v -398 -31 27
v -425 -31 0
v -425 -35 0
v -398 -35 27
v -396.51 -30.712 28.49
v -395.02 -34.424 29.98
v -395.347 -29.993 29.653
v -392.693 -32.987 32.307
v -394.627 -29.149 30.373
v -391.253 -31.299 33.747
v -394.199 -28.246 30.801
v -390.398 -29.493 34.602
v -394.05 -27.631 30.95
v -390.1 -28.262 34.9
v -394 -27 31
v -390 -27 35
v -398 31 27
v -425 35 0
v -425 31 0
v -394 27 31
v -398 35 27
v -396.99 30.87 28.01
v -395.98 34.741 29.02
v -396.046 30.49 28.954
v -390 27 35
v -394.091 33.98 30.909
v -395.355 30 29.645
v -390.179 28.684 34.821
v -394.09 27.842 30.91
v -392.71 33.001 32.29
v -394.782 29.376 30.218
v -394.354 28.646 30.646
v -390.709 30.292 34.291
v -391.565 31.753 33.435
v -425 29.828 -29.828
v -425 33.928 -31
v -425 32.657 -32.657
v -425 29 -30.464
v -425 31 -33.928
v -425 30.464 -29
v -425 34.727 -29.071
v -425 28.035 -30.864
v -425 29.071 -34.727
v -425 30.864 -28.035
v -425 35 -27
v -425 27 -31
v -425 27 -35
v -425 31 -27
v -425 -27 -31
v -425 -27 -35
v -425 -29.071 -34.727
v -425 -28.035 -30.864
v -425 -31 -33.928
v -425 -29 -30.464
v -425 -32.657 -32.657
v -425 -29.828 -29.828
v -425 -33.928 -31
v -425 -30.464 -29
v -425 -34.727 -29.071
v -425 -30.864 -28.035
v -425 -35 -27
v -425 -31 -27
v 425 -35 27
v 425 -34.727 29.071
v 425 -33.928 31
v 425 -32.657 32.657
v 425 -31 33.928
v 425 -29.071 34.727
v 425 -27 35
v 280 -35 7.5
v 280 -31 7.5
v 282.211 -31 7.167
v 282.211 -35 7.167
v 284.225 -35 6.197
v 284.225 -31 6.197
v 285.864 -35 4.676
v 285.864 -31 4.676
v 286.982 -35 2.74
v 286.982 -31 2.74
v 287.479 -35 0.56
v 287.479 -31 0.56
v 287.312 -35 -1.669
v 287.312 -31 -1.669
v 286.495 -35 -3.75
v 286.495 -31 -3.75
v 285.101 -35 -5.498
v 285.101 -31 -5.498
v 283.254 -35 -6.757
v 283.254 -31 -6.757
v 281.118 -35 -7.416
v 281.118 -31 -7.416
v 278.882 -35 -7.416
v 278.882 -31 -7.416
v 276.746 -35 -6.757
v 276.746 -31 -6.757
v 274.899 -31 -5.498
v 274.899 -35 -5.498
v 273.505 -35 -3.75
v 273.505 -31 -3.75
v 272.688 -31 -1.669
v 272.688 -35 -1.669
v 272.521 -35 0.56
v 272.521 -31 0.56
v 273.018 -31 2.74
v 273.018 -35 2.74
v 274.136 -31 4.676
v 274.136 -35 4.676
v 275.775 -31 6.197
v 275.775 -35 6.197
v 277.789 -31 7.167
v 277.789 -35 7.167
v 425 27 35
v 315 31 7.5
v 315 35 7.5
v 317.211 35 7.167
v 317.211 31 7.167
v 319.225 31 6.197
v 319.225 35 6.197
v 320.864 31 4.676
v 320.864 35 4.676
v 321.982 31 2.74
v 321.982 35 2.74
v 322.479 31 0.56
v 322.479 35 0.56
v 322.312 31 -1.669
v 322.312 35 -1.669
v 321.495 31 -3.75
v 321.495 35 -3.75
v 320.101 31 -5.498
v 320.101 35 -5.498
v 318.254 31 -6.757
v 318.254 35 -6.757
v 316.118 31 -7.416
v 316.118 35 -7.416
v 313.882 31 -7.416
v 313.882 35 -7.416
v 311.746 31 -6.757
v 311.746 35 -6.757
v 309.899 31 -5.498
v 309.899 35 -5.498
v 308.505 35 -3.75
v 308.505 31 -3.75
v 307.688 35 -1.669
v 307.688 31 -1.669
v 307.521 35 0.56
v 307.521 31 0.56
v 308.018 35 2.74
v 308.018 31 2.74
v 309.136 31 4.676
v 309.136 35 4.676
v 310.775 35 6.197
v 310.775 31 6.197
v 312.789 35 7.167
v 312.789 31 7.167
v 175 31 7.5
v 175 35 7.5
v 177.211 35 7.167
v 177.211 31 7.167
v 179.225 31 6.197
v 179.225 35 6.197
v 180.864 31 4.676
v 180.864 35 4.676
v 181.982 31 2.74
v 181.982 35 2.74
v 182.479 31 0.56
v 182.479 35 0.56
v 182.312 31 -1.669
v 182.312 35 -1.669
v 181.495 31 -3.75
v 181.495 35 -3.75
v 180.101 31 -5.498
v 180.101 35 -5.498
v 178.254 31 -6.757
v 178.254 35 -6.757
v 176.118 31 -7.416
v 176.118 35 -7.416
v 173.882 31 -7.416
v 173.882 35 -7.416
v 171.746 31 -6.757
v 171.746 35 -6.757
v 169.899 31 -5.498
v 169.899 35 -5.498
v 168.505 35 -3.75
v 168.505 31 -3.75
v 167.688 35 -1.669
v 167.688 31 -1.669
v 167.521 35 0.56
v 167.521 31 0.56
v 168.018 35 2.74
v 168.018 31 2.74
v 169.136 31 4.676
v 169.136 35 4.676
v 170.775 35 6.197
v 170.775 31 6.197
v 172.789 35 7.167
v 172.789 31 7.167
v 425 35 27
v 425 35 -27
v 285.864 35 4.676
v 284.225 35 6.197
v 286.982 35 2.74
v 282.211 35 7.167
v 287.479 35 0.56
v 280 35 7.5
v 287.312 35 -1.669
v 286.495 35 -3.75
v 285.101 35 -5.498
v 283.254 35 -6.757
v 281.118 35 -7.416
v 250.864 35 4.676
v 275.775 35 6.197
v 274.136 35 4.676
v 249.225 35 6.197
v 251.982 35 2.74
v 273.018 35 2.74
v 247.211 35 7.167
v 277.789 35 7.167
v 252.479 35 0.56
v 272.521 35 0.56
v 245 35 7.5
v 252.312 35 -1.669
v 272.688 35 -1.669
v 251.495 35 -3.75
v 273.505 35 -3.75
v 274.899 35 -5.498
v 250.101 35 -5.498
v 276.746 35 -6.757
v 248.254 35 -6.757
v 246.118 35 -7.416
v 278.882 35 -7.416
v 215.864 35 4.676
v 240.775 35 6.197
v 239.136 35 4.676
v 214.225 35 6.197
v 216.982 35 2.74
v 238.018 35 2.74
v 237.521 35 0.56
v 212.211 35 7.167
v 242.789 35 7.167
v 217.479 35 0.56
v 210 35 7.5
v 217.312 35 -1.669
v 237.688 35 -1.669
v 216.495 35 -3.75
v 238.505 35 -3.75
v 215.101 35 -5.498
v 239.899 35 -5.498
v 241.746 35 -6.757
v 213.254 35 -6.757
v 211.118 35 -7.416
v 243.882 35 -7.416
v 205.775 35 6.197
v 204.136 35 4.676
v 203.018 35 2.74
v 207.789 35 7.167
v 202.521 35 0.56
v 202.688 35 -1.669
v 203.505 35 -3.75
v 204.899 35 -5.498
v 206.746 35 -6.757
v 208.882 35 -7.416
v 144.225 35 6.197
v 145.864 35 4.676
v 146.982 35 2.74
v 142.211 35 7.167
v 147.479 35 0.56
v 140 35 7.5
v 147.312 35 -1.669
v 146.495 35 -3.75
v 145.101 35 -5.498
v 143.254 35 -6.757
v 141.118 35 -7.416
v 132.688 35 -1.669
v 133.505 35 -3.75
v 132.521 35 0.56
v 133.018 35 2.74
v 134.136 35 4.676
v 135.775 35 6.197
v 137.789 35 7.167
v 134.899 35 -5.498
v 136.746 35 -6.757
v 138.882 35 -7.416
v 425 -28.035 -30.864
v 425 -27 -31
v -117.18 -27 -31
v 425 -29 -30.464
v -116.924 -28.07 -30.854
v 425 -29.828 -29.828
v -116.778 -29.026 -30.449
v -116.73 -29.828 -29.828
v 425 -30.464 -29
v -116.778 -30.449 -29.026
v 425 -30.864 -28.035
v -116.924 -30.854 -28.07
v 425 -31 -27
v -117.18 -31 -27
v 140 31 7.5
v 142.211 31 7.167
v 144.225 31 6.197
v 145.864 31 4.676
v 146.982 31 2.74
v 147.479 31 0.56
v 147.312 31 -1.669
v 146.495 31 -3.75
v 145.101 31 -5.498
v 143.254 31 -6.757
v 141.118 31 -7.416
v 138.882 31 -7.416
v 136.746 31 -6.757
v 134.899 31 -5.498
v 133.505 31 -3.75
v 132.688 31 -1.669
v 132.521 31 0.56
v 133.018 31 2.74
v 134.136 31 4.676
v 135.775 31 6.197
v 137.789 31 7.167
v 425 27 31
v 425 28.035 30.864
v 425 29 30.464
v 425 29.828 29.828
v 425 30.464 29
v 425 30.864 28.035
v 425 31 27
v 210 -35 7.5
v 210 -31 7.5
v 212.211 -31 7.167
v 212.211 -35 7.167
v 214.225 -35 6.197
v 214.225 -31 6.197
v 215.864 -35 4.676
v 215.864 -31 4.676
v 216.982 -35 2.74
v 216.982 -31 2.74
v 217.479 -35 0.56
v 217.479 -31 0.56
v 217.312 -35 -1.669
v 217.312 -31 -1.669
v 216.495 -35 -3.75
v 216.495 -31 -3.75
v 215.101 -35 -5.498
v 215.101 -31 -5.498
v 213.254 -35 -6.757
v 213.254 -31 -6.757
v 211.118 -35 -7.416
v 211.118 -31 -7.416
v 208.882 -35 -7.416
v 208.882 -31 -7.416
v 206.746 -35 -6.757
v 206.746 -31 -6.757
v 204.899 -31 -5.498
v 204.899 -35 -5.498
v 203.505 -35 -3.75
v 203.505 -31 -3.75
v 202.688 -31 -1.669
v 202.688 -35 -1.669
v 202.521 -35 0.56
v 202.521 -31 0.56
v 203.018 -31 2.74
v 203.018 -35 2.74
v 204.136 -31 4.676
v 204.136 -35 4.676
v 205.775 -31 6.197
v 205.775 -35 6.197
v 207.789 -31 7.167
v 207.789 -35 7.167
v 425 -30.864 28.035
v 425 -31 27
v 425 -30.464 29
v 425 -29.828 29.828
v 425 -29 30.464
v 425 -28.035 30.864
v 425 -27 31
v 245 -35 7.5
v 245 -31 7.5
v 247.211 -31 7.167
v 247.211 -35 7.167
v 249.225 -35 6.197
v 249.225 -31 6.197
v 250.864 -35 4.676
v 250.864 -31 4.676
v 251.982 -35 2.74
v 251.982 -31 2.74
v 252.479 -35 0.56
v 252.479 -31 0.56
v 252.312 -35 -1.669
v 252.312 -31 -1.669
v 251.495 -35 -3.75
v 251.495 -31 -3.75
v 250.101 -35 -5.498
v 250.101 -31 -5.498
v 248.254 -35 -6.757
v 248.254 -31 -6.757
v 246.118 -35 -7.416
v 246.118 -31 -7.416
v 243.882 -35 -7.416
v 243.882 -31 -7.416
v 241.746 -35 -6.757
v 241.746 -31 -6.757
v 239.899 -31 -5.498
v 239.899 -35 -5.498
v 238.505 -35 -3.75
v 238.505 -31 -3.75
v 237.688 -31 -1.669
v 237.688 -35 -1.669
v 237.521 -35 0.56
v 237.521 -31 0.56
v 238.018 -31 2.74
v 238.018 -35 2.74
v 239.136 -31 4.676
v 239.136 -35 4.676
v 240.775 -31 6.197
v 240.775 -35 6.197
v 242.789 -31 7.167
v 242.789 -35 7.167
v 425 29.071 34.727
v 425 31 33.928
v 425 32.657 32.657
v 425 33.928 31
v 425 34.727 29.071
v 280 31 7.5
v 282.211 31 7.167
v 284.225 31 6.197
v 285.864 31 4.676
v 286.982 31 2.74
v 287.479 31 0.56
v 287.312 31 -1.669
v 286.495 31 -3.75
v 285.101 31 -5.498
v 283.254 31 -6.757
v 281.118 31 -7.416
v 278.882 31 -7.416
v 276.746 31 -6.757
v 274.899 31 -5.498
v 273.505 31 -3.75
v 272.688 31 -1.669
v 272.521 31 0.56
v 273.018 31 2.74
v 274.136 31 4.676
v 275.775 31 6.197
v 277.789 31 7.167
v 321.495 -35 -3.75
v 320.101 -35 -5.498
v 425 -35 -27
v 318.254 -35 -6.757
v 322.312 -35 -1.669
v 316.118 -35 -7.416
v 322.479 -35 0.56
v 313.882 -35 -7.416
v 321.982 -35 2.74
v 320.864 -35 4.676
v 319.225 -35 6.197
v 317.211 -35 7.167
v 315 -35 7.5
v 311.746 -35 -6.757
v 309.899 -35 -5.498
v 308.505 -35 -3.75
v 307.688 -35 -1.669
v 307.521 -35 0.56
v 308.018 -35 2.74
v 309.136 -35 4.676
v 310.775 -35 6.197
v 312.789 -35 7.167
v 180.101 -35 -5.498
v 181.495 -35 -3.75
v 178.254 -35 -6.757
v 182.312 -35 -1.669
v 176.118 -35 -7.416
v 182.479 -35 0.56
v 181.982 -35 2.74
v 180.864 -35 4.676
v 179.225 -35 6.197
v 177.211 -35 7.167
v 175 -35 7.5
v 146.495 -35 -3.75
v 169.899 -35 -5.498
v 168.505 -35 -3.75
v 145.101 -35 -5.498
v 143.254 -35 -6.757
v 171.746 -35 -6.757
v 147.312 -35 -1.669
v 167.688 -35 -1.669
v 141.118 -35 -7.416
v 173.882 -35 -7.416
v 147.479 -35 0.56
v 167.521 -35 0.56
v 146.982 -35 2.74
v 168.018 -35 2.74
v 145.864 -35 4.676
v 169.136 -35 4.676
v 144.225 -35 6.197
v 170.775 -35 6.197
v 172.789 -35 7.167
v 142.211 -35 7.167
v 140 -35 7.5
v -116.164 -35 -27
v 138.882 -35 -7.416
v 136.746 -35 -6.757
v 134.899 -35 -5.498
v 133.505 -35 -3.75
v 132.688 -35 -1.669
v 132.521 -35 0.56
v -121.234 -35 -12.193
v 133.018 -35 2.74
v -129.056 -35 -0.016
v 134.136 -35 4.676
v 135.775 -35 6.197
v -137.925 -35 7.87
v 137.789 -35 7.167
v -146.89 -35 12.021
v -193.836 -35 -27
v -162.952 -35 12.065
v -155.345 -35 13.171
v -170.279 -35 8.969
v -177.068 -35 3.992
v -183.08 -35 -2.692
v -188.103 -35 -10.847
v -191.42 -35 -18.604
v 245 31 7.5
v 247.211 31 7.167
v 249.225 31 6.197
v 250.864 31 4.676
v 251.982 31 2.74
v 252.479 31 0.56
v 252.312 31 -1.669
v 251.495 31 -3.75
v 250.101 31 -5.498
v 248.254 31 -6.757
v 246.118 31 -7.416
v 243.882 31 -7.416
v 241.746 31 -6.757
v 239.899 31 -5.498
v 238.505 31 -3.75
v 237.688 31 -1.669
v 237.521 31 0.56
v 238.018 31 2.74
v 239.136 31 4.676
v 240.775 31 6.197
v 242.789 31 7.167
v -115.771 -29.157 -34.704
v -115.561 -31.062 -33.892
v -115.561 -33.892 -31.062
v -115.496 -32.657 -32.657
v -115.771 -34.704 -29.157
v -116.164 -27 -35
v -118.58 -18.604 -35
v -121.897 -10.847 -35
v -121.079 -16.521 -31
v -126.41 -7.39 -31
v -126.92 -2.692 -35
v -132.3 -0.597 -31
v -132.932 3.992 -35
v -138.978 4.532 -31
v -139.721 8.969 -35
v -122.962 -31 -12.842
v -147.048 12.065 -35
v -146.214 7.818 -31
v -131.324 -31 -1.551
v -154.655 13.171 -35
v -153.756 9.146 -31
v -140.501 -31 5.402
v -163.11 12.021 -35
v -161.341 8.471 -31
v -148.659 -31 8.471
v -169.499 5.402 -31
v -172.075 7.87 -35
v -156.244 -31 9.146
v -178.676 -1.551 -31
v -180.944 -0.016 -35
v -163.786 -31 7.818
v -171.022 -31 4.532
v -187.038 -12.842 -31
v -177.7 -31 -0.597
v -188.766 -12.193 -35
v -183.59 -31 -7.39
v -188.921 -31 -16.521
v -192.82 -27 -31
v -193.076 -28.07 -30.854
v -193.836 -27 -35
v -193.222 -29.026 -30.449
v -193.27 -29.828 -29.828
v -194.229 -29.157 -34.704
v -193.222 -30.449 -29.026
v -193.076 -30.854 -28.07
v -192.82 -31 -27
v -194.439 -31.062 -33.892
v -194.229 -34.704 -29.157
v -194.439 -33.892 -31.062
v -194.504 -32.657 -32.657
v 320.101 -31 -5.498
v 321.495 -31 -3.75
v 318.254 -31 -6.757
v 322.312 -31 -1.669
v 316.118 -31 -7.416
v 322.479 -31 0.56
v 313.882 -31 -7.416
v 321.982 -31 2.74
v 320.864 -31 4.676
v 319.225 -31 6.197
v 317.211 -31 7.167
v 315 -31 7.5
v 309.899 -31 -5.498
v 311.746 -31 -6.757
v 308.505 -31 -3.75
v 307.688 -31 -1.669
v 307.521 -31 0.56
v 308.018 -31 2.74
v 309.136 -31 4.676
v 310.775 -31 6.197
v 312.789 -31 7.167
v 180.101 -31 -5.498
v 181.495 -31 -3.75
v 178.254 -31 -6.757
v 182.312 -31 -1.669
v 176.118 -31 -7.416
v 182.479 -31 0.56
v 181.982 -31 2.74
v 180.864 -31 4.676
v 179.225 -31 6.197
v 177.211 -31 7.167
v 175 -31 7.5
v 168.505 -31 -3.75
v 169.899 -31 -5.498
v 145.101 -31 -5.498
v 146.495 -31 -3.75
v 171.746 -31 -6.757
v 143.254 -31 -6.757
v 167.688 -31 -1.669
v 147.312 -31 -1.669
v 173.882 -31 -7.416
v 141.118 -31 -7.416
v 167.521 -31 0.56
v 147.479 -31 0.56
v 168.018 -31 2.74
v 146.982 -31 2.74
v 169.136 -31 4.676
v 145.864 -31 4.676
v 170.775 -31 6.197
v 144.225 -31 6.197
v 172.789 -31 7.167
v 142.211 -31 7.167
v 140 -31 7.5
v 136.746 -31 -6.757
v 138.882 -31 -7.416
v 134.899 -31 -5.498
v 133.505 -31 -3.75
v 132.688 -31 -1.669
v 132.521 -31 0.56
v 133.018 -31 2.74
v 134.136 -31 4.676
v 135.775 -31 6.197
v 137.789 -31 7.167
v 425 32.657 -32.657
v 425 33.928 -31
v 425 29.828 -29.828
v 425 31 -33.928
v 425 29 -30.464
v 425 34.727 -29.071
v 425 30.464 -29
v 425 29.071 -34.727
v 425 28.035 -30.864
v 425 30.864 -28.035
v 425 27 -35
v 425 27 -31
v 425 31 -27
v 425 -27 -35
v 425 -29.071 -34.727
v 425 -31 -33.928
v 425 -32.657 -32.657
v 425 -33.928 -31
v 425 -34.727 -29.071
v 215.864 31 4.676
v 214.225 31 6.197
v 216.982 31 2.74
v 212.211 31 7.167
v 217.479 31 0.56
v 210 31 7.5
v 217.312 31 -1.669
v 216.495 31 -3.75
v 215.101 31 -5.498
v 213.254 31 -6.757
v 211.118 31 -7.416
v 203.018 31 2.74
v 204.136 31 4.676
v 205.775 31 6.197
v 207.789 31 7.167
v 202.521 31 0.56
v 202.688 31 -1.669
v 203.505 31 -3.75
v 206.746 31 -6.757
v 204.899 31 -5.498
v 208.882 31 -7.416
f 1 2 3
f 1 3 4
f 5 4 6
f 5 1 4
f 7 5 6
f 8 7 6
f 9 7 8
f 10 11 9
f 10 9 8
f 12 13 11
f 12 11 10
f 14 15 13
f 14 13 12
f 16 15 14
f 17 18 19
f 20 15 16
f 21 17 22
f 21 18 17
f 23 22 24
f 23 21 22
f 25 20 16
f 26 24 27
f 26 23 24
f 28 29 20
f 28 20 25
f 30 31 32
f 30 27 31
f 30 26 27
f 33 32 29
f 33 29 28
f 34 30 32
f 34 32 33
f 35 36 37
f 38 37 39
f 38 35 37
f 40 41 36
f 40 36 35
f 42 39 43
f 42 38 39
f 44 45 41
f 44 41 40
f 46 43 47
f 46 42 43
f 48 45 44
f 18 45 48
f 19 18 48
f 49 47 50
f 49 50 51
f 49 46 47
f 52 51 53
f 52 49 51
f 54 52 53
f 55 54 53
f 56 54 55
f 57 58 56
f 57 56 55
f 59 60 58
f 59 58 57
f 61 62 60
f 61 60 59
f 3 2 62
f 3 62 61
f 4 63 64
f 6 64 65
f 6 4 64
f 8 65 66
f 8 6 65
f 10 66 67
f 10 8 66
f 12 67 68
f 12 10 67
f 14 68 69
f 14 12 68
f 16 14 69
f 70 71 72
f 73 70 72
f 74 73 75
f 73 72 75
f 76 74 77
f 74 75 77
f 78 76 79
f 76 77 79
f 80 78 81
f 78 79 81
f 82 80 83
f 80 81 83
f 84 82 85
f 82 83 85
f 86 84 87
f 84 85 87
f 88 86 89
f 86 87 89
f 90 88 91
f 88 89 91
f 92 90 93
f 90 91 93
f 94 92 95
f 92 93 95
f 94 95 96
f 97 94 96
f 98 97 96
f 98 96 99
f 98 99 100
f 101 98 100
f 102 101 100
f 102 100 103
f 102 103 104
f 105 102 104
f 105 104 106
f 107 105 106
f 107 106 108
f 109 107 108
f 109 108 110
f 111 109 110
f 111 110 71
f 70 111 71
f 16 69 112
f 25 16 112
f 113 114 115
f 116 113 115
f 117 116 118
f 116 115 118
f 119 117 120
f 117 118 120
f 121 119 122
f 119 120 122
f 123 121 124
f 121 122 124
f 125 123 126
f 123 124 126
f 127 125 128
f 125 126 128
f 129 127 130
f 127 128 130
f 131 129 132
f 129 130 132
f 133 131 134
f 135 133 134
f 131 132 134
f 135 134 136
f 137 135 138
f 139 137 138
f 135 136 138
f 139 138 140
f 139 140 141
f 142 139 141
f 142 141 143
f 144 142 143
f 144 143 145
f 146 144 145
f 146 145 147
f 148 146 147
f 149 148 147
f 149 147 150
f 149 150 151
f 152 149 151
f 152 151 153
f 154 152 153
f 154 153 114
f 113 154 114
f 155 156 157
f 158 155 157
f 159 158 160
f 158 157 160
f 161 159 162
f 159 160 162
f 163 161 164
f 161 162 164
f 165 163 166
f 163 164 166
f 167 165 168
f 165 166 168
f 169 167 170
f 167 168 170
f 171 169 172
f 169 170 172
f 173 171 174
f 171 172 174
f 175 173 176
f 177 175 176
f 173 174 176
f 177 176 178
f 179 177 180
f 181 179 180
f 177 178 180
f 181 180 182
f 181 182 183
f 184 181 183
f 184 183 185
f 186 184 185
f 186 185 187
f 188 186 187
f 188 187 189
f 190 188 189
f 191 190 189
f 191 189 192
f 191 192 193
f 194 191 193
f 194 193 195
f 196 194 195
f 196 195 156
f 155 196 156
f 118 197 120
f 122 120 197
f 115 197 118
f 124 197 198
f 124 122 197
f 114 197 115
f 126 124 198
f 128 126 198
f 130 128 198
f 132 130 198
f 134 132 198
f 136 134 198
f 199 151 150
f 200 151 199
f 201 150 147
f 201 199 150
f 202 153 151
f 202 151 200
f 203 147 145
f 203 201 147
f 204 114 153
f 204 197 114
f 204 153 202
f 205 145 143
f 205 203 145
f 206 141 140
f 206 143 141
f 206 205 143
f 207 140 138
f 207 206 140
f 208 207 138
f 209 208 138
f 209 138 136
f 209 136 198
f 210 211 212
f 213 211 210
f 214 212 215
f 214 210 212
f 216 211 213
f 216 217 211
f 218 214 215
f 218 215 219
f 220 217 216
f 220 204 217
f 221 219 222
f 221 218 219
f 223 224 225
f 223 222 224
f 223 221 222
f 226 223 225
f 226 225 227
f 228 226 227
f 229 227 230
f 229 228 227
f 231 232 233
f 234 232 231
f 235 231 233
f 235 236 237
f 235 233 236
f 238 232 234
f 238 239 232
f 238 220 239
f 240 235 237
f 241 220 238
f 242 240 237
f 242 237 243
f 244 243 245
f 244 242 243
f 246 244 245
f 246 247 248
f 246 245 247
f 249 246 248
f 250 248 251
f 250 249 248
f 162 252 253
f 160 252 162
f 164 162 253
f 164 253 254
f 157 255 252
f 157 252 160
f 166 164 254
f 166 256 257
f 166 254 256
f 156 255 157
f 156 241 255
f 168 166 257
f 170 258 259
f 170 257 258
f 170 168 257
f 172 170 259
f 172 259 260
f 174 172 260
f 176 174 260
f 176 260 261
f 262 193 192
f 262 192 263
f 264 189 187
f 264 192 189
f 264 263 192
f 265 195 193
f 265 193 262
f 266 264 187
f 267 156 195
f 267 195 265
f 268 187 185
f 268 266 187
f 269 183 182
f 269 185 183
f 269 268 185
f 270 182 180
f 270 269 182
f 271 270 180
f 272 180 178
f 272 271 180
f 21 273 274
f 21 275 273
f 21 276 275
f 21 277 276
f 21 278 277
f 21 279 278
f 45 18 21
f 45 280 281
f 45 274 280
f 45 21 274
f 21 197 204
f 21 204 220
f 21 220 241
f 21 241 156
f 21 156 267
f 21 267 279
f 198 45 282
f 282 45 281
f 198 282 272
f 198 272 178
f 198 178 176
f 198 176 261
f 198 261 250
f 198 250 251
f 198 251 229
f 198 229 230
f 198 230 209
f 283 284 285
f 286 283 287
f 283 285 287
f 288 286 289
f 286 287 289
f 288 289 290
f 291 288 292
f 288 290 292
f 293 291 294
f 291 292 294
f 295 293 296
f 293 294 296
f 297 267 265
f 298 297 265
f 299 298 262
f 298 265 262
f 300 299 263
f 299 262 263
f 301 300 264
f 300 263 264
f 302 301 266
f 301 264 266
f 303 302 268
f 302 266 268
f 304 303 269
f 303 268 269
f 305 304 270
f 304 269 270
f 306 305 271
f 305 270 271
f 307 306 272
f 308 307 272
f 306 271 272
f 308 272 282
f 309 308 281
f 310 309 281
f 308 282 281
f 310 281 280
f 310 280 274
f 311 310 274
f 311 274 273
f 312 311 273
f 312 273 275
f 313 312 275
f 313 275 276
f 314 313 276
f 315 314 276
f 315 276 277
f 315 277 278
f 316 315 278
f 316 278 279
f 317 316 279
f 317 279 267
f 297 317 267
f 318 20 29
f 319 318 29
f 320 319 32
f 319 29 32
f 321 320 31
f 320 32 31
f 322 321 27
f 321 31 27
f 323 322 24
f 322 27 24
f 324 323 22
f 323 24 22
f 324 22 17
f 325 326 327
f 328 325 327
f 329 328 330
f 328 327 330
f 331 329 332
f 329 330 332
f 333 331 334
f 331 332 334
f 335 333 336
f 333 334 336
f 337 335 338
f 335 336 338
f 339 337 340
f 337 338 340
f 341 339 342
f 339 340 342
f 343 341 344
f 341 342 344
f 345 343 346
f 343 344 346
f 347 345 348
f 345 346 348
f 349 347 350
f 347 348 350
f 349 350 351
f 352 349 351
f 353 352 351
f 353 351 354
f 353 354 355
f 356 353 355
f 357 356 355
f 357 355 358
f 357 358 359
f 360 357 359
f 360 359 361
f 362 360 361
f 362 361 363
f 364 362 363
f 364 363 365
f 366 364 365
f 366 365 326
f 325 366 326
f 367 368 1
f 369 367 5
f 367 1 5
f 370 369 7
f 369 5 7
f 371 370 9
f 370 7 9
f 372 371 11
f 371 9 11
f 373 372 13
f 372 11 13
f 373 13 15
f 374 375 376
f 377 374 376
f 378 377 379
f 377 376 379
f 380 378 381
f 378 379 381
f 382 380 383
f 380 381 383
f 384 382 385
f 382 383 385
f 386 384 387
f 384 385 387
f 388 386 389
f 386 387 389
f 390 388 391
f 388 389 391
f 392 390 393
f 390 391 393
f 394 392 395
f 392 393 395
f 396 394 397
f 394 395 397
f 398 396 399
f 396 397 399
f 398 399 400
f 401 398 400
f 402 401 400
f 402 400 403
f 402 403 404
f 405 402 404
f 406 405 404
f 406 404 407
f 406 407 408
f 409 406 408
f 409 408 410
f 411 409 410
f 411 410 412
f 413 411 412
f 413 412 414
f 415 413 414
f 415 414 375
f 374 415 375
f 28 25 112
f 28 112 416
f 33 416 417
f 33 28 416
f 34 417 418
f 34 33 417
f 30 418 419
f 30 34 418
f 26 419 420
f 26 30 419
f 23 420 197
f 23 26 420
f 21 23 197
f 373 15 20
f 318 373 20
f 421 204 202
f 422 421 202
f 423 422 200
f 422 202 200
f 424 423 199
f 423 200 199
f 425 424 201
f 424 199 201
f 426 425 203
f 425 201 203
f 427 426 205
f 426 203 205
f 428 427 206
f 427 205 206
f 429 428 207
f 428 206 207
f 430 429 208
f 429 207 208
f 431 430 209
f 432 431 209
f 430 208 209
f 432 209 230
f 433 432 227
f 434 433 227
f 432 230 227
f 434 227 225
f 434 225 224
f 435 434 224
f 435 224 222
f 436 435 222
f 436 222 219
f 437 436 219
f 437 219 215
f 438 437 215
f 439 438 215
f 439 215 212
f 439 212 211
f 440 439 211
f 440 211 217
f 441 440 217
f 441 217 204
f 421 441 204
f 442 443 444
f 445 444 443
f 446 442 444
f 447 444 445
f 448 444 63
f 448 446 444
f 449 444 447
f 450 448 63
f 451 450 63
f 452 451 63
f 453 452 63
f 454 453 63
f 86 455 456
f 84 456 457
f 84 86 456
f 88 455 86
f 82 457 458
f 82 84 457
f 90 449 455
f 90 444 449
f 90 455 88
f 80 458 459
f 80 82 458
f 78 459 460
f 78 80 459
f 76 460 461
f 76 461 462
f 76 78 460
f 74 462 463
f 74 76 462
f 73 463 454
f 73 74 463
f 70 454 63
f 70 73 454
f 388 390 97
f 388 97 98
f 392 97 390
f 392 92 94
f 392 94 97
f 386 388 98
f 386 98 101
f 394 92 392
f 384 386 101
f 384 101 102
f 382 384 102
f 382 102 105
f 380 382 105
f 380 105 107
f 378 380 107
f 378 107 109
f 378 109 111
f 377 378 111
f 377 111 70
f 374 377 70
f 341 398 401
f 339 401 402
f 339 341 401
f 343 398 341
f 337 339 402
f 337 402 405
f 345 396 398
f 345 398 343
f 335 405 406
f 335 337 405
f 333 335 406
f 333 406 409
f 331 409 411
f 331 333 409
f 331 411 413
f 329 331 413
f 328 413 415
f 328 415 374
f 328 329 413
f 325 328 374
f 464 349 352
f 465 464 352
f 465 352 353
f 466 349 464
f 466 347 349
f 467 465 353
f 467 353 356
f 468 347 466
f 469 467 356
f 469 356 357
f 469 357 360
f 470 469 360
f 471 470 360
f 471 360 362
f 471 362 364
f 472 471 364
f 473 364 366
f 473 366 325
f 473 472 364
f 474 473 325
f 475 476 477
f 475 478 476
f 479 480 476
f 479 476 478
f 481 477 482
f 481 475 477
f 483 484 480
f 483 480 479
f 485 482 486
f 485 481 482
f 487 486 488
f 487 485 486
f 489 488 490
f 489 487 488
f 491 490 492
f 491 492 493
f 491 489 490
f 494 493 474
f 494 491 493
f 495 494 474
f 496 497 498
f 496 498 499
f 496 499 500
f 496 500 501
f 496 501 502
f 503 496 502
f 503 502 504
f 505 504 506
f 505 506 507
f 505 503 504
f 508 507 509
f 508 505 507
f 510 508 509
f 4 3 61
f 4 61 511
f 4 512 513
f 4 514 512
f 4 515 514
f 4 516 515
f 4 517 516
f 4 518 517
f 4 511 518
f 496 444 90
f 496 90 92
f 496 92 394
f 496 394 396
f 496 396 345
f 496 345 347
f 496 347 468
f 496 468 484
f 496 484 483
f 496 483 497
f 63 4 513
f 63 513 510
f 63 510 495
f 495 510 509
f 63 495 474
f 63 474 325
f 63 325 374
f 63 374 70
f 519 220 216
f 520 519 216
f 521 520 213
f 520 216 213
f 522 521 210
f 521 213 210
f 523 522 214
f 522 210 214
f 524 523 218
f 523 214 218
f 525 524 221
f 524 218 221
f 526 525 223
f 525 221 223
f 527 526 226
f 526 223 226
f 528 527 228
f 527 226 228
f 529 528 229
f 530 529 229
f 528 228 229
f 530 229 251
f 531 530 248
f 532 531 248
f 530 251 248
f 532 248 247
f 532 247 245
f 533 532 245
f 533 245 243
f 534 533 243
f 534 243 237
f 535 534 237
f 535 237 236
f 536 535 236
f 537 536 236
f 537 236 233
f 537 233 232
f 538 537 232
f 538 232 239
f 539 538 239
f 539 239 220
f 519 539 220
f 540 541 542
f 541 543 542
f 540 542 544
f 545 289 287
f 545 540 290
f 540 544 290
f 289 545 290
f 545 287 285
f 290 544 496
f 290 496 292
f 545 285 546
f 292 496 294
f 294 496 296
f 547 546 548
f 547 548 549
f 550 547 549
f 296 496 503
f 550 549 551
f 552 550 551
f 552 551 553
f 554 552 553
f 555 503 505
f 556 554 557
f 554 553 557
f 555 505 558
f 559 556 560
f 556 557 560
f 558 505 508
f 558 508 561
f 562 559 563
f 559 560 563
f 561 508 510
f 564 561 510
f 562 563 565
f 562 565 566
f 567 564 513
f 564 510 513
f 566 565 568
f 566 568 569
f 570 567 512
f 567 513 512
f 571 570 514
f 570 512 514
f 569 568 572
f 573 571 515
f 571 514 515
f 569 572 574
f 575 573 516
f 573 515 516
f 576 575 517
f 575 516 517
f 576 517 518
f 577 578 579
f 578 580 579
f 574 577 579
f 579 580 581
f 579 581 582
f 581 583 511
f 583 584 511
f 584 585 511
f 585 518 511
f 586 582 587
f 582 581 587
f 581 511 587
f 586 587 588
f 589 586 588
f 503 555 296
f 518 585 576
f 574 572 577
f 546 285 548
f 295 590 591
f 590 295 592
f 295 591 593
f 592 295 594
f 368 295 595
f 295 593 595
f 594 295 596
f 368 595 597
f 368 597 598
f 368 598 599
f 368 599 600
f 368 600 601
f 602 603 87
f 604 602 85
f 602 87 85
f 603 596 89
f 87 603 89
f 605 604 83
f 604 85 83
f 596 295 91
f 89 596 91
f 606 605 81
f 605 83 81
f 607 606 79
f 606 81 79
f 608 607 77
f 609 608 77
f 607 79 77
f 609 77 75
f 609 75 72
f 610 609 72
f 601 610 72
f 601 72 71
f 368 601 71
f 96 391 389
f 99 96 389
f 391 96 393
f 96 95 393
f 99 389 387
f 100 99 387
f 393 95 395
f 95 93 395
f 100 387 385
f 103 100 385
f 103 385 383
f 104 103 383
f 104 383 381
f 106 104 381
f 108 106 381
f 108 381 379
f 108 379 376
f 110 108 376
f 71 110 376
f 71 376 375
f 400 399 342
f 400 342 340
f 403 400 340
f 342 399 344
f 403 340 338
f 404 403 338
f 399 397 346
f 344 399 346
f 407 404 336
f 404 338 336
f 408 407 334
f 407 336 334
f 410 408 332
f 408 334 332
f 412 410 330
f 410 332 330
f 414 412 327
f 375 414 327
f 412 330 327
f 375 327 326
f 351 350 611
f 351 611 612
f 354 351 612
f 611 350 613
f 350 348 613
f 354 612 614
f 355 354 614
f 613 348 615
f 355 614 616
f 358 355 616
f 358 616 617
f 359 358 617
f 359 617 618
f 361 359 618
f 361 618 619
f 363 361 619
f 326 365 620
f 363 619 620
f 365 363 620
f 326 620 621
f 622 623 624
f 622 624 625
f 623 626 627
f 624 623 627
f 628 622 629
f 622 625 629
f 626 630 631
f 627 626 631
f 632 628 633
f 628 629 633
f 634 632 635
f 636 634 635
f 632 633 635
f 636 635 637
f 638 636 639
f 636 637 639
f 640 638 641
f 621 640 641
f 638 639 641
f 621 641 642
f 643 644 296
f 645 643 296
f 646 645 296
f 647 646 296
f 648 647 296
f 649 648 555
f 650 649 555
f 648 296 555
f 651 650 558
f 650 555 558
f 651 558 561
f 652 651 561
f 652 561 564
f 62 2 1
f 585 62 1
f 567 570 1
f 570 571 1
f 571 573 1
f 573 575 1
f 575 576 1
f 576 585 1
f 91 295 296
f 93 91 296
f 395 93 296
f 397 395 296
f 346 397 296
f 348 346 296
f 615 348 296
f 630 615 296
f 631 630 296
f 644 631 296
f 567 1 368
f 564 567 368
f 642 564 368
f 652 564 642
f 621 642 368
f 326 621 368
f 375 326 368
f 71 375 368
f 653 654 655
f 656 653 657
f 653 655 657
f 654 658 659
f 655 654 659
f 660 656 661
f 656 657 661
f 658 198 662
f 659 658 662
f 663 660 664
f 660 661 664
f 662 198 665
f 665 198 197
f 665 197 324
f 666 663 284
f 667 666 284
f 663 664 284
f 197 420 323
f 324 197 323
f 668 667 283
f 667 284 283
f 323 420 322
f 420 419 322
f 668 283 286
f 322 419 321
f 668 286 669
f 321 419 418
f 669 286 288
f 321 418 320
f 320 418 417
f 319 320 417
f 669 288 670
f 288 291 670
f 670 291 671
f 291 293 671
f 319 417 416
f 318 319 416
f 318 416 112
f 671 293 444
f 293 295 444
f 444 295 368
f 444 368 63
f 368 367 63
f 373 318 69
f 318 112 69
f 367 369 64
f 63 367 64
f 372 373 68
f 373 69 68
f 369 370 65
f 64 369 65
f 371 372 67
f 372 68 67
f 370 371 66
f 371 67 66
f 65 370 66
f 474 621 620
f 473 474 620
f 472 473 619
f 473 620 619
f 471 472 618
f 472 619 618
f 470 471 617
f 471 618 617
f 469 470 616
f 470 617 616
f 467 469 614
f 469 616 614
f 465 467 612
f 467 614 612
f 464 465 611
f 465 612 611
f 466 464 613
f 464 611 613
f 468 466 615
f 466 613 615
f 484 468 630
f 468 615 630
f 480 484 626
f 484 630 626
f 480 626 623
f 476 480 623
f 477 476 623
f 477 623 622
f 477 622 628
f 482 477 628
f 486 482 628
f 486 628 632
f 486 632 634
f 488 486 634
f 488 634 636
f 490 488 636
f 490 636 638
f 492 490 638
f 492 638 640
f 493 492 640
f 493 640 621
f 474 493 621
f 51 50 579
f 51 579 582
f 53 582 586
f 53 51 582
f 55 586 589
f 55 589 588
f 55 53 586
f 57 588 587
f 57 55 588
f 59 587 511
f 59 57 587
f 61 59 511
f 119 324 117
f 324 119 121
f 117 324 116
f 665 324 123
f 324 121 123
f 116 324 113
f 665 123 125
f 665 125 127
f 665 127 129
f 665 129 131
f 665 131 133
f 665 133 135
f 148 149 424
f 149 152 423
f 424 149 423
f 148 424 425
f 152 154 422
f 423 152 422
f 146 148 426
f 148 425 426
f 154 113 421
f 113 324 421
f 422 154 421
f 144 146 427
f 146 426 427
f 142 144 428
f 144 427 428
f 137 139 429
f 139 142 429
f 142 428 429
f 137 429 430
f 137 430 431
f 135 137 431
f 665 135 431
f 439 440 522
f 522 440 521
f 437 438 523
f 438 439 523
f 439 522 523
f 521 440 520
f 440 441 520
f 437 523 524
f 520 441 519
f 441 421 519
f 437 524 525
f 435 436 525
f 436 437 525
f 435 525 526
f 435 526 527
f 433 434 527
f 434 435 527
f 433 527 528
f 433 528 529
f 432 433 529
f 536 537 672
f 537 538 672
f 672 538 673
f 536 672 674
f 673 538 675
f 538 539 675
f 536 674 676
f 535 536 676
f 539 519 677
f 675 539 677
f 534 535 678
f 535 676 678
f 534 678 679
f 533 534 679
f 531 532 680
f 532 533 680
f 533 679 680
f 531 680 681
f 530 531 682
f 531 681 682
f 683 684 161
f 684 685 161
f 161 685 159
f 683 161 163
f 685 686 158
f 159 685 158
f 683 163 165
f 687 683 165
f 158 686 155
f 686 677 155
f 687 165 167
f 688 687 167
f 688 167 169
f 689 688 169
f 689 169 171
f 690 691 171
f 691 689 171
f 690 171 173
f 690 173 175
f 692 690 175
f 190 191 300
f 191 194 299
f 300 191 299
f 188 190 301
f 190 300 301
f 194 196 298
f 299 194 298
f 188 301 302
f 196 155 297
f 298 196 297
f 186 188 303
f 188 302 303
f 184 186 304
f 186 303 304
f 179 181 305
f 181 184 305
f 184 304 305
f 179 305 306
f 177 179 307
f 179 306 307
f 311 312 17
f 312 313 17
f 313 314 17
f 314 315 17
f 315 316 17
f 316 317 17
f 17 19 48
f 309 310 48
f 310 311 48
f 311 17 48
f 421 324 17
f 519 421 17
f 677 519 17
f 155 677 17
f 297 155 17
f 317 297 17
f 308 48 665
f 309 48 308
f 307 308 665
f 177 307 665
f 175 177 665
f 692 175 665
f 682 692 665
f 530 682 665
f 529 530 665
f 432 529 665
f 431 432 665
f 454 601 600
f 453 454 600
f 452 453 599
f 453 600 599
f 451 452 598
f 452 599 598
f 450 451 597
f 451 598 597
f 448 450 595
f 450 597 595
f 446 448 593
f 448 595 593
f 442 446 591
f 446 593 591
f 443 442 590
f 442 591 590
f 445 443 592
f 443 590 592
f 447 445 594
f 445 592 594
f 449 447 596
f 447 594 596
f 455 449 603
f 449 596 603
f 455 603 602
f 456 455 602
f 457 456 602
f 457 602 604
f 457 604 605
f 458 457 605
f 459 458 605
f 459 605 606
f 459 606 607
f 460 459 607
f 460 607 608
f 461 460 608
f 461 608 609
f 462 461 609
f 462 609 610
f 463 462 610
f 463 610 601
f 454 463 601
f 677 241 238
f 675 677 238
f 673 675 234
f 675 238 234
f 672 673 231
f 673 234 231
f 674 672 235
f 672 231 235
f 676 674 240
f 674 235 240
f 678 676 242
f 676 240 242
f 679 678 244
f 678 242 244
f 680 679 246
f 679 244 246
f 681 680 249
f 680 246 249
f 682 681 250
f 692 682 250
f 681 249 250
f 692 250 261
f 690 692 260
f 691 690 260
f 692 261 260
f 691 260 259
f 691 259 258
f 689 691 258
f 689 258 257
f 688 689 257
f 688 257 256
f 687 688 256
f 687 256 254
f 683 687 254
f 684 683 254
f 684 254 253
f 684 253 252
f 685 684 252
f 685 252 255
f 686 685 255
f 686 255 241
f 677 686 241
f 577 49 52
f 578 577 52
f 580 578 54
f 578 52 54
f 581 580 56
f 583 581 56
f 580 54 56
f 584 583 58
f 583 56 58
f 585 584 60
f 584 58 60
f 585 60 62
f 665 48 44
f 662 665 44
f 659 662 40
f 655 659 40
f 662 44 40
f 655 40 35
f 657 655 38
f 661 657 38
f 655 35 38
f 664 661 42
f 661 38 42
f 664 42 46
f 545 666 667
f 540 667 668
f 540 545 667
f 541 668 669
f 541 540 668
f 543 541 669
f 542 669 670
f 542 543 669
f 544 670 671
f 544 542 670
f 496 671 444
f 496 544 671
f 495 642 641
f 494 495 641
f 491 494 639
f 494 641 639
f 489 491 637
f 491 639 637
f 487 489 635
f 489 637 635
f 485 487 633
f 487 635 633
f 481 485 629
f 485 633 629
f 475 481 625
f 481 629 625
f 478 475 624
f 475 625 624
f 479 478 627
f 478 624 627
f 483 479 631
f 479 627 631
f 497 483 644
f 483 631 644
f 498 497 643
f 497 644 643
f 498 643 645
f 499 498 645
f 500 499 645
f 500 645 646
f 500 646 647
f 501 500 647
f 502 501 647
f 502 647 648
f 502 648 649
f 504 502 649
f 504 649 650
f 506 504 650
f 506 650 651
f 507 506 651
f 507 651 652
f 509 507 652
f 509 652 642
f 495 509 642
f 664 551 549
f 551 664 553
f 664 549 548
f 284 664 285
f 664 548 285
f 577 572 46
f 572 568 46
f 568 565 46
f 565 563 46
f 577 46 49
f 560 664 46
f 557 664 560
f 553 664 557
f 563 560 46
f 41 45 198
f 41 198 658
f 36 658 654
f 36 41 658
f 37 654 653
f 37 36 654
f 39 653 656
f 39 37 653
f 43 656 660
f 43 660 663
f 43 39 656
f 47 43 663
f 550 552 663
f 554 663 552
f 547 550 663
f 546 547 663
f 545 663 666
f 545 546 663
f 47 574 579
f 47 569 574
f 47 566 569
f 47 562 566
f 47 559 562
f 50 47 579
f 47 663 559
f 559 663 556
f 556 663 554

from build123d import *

# Parameters (mm, degrees)
EL_MENT_M_CANO_SOUD_1_DEPTH = 850
ESQUISSE3_R                 = 7.5
ENL_V_MAT_EXTRU_2_DEPTH     = 90
ENL_V_MAT_EXTRU_3_DEPTH     = 71
ESQUISSE6_R                 = 40.75
ENL_V_MAT_EXTRU_4_DEPTH     = 90


with BuildPart() as part:
    # tube carré1 → Elément mécano-soudé1 (new body)
    with BuildSketch(Plane.YZ.offset(-425)):
        with BuildLine():
            Line((-27, 35), (27, 35))
            ThreePointArc((27, 35), (32.656854249, 32.656854249), (35, 27))
            Line((35, 27), (35, -27))
            ThreePointArc((35, -27), (32.656854249, -32.656854249), (27, -35))
            Line((27, -35), (-27, -35))
            ThreePointArc((-27, -35), (-32.656854249, -32.656854249), (-35, -27))
            Line((-35, -27), (-35, 27))
            ThreePointArc((-35, 27), (-32.656854249, 32.656854249), (-27, 35))
        make_face()
        with BuildLine():
            Line((-27, 31), (27, 31))
            ThreePointArc((27, 31), (29.828427336, 29.828426914), (31, 26.999999403))
            Line((31, 26.999999403), (31, -26.999999403))
            ThreePointArc((31, -26.999999403), (29.828427336, -29.828426914), (27, -31))
            Line((27, -31), (-27, -31))
            ThreePointArc((-27, -31), (-29.828427336, -29.828426914), (-31, -26.999999403))
            Line((-31, -26.999999403), (-31, 26.999999403))
            ThreePointArc((-31, 26.999999403), (-29.828427336, 29.828426914), (-27, 31))
        make_face(mode=Mode.SUBTRACT)
    extrude(amount=EL_MENT_M_CANO_SOUD_1_DEPTH)

    # Esquisse3 → Enlèv. mat.-Extru.2 (cut)
    with BuildSketch(Plane(origin=(0, 35, 0), x_dir=(1, 0, 0), z_dir=(0, 1, 0))):
        with Locations(Location((315, 0, 0), (0, 0, 270))):  # turned: the seam where the file's is
            Circle(ESQUISSE3_R)
        with Locations(Location((280, 0, 0), (0, 0, 270))):  # turned: the seam where the file's is
            Circle(ESQUISSE3_R)
        with Locations(Location((245, 0, 0), (0, 0, 270))):  # turned: the seam where the file's is
            Circle(ESQUISSE3_R)
        with Locations(Location((210, 0, 0), (0, 0, 270))):  # turned: the seam where the file's is
            Circle(ESQUISSE3_R)
        with Locations(Location((175, 0, 0), (0, 0, 270))):  # turned: the seam where the file's is
            Circle(ESQUISSE3_R)
        with Locations(Location((140, 0, 0), (0, 0, 270))):  # turned: the seam where the file's is
            Circle(ESQUISSE3_R)
    extrude(amount=-ENL_V_MAT_EXTRU_2_DEPTH, mode=Mode.SUBTRACT)

    # Esquisse5 → Enlèv. mat.-Extru.3 (cut, through all)
    with BuildSketch(Plane(origin=(0, 35, 0), x_dir=(1, 0, 0), z_dir=(0, 1, 0))):
        Polygon((-425, 0), (-390, -35), (-425, -35), align=None)
    extrude(amount=-ENL_V_MAT_EXTRU_3_DEPTH, mode=Mode.SUBTRACT)

    # Esquisse6 → Enlèv. mat.-Extru.4 (cut, symmetric)
    with BuildSketch(Plane(origin=(0, 2.000000299, -2.000000299), x_dir=(1, 0, 0), z_dir=(0, -0.707106781, 0.707106781))):
        with Locations((-155, -56.183766184)):
            Circle(ESQUISSE6_R)
    extrude(amount=ENL_V_MAT_EXTRU_4_DEPTH, both=True, mode=Mode.SUBTRACT)


solid = part.part
